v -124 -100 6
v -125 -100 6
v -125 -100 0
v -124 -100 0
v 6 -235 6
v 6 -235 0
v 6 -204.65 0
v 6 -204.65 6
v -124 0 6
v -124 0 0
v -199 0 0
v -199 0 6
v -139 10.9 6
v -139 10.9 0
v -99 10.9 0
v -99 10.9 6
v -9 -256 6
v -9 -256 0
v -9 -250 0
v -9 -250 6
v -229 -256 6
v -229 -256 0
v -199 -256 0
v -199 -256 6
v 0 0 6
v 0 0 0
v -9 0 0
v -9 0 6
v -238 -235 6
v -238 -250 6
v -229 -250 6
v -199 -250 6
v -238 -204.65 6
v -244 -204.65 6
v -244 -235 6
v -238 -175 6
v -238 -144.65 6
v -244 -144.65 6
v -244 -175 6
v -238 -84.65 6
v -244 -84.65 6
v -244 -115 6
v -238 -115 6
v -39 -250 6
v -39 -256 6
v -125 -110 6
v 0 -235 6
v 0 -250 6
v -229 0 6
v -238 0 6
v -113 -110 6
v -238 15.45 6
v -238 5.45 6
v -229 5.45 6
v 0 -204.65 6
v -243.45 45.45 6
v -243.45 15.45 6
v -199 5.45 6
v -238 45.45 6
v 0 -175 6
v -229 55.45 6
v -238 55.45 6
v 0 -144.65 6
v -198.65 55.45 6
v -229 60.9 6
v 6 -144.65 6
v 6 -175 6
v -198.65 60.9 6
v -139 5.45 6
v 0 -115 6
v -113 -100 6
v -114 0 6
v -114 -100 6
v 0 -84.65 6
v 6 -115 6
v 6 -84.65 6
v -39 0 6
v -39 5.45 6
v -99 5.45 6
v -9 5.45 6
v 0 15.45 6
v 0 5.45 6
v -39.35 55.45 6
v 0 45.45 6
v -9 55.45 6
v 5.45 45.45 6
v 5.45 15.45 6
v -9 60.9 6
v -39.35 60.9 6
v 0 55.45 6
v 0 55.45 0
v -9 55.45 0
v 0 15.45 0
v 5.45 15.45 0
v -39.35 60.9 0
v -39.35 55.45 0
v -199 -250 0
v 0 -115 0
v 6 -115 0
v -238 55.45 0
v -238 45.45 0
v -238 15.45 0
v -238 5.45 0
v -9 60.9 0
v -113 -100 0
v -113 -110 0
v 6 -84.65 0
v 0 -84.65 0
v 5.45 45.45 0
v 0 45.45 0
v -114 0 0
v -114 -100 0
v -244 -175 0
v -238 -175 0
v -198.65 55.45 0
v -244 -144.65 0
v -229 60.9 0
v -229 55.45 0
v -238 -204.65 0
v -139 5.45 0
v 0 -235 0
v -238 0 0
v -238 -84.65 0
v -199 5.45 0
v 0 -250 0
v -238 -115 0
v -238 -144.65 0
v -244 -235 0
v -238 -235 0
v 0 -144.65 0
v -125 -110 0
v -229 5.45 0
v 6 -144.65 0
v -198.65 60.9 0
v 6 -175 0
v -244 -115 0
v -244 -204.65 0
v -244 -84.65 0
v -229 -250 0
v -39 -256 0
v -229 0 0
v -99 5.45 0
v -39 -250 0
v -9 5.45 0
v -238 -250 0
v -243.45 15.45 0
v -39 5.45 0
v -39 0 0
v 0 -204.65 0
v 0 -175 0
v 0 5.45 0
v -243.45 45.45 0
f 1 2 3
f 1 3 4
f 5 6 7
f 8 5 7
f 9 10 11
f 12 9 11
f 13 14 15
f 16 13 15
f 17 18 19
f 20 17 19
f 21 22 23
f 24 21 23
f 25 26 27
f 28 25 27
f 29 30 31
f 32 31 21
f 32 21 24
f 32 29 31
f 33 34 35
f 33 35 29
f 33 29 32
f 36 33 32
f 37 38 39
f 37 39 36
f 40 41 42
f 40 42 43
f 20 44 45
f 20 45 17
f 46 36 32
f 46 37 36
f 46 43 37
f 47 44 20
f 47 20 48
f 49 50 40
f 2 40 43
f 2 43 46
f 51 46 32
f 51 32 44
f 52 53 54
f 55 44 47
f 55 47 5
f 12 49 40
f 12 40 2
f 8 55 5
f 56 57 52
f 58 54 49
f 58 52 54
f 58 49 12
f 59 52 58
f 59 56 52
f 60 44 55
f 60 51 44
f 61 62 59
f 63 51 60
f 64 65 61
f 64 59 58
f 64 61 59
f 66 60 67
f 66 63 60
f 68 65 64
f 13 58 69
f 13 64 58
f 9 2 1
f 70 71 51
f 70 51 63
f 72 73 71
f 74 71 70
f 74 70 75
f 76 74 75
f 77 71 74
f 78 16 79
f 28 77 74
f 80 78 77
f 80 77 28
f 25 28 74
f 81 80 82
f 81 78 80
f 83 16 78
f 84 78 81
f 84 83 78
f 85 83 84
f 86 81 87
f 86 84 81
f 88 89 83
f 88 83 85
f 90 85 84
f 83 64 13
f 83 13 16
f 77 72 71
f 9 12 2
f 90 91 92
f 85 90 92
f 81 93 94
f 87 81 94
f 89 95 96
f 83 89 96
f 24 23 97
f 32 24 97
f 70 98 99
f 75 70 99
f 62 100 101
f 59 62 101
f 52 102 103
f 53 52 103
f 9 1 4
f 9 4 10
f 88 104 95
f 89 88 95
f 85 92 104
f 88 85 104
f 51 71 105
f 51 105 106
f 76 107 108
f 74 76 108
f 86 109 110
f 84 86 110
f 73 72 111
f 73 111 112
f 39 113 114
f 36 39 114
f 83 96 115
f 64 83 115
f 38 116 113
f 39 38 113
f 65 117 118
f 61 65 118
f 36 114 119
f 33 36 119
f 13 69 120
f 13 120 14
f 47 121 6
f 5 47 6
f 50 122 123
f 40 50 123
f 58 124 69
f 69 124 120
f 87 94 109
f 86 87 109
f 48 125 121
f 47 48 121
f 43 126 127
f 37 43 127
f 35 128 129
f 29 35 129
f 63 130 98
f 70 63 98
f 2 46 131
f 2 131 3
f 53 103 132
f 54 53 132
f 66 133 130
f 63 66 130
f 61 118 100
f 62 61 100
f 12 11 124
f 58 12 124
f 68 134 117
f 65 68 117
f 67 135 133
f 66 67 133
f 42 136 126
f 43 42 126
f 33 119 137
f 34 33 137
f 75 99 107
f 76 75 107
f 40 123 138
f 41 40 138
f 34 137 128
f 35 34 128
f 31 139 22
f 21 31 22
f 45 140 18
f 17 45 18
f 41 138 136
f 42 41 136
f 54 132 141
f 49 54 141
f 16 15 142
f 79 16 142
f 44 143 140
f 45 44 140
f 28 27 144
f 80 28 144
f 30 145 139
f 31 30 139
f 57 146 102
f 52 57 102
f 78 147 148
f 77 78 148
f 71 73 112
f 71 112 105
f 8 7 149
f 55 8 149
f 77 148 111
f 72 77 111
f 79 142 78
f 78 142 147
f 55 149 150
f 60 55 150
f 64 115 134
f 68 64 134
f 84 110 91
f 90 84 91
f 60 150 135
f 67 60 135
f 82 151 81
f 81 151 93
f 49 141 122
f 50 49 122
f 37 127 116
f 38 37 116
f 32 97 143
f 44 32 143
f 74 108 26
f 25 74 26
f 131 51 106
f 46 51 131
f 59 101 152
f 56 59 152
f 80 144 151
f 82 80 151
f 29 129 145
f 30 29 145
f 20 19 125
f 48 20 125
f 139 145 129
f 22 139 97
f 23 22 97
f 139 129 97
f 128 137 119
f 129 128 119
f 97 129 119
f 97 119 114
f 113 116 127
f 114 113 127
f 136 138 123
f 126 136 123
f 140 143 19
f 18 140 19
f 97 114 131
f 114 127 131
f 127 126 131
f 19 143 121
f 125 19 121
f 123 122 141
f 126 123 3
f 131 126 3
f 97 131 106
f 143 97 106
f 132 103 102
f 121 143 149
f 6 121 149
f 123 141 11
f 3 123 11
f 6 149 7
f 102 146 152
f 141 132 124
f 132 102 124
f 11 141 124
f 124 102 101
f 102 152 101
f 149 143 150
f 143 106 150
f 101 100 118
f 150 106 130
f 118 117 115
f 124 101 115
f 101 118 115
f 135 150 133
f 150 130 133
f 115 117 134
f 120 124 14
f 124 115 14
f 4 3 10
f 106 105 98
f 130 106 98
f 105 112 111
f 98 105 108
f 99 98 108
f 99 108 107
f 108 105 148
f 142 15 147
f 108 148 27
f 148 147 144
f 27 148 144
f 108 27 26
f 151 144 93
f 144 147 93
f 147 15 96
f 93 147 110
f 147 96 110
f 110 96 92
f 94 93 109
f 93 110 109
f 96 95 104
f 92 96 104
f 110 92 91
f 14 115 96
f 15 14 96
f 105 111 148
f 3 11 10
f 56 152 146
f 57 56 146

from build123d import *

# Parameters (mm, degrees)
EXTRUDE_1_DEPTH     = 6
CUT_EXTRUDE_1_DEPTH = 10


with BuildPart() as part:
    # Эскиз2 → Бобышка-Вытянуть1 (new body)
    with BuildSketch(Plane.XY):
        Polygon((0, 0), (-9, 0), (-9, 5.45), (0, 5.45), (0, 15.45), (5.45, 15.45), (5.45, 45.45), (0, 45.45), (0, 55.45), (-9, 55.45), (-9, 60.9), (-39.35, 60.9), (-39.35, 55.45), (-198.65, 55.45), (-198.65, 60.9), (-229, 60.9), (-229, 55.45), (-238, 55.45), (-238, 45.45), (-243.45, 45.45), (-243.45, 15.45), (-238, 15.45), (-238, 5.45), (-229, 5.45), (-229, 0), (-238, 0), (-238, -84.65), (-244, -84.65), (-244, -115), (-238, -115), (-238, -144.65), (-244, -144.65), (-244, -175), (-238, -175), (-238, -204.65), (-244, -204.65), (-244, -235), (-238, -235), (-238, -250), (-229, -250), (-229, -256), (-199, -256), (-199, -250), (-39, -250), (-39, -256), (-9, -256), (-9, -250), (0, -250), (0, -235), (6, -235), (6, -204.65), (0, -204.65), (0, -175), (6, -175), (6, -144.65), (0, -144.65), (0, -115), (6, -115), (6, -84.65), (0, -84.65), align=None)
        Polygon((-199, 0), (-199, 5.45), (-139, 5.45), (-139, 10.9), (-99, 10.9), (-99, 5.45), (-39, 5.45), (-39, 0), align=None, mode=Mode.SUBTRACT)
    extrude(amount=EXTRUDE_1_DEPTH)

    # Эскиз4 → Вырез-Вытянуть1 (cut)
    with BuildSketch(Plane.XY.offset(6)):
        Polygon((-114, -100), (-113, -100), (-113, -110), (-125, -110), (-125, -100), (-124, -100), (-124, 0), (-114, 0), align=None)
    extrude(amount=-CUT_EXTRUDE_1_DEPTH, mode=Mode.SUBTRACT)


solid = part.part
